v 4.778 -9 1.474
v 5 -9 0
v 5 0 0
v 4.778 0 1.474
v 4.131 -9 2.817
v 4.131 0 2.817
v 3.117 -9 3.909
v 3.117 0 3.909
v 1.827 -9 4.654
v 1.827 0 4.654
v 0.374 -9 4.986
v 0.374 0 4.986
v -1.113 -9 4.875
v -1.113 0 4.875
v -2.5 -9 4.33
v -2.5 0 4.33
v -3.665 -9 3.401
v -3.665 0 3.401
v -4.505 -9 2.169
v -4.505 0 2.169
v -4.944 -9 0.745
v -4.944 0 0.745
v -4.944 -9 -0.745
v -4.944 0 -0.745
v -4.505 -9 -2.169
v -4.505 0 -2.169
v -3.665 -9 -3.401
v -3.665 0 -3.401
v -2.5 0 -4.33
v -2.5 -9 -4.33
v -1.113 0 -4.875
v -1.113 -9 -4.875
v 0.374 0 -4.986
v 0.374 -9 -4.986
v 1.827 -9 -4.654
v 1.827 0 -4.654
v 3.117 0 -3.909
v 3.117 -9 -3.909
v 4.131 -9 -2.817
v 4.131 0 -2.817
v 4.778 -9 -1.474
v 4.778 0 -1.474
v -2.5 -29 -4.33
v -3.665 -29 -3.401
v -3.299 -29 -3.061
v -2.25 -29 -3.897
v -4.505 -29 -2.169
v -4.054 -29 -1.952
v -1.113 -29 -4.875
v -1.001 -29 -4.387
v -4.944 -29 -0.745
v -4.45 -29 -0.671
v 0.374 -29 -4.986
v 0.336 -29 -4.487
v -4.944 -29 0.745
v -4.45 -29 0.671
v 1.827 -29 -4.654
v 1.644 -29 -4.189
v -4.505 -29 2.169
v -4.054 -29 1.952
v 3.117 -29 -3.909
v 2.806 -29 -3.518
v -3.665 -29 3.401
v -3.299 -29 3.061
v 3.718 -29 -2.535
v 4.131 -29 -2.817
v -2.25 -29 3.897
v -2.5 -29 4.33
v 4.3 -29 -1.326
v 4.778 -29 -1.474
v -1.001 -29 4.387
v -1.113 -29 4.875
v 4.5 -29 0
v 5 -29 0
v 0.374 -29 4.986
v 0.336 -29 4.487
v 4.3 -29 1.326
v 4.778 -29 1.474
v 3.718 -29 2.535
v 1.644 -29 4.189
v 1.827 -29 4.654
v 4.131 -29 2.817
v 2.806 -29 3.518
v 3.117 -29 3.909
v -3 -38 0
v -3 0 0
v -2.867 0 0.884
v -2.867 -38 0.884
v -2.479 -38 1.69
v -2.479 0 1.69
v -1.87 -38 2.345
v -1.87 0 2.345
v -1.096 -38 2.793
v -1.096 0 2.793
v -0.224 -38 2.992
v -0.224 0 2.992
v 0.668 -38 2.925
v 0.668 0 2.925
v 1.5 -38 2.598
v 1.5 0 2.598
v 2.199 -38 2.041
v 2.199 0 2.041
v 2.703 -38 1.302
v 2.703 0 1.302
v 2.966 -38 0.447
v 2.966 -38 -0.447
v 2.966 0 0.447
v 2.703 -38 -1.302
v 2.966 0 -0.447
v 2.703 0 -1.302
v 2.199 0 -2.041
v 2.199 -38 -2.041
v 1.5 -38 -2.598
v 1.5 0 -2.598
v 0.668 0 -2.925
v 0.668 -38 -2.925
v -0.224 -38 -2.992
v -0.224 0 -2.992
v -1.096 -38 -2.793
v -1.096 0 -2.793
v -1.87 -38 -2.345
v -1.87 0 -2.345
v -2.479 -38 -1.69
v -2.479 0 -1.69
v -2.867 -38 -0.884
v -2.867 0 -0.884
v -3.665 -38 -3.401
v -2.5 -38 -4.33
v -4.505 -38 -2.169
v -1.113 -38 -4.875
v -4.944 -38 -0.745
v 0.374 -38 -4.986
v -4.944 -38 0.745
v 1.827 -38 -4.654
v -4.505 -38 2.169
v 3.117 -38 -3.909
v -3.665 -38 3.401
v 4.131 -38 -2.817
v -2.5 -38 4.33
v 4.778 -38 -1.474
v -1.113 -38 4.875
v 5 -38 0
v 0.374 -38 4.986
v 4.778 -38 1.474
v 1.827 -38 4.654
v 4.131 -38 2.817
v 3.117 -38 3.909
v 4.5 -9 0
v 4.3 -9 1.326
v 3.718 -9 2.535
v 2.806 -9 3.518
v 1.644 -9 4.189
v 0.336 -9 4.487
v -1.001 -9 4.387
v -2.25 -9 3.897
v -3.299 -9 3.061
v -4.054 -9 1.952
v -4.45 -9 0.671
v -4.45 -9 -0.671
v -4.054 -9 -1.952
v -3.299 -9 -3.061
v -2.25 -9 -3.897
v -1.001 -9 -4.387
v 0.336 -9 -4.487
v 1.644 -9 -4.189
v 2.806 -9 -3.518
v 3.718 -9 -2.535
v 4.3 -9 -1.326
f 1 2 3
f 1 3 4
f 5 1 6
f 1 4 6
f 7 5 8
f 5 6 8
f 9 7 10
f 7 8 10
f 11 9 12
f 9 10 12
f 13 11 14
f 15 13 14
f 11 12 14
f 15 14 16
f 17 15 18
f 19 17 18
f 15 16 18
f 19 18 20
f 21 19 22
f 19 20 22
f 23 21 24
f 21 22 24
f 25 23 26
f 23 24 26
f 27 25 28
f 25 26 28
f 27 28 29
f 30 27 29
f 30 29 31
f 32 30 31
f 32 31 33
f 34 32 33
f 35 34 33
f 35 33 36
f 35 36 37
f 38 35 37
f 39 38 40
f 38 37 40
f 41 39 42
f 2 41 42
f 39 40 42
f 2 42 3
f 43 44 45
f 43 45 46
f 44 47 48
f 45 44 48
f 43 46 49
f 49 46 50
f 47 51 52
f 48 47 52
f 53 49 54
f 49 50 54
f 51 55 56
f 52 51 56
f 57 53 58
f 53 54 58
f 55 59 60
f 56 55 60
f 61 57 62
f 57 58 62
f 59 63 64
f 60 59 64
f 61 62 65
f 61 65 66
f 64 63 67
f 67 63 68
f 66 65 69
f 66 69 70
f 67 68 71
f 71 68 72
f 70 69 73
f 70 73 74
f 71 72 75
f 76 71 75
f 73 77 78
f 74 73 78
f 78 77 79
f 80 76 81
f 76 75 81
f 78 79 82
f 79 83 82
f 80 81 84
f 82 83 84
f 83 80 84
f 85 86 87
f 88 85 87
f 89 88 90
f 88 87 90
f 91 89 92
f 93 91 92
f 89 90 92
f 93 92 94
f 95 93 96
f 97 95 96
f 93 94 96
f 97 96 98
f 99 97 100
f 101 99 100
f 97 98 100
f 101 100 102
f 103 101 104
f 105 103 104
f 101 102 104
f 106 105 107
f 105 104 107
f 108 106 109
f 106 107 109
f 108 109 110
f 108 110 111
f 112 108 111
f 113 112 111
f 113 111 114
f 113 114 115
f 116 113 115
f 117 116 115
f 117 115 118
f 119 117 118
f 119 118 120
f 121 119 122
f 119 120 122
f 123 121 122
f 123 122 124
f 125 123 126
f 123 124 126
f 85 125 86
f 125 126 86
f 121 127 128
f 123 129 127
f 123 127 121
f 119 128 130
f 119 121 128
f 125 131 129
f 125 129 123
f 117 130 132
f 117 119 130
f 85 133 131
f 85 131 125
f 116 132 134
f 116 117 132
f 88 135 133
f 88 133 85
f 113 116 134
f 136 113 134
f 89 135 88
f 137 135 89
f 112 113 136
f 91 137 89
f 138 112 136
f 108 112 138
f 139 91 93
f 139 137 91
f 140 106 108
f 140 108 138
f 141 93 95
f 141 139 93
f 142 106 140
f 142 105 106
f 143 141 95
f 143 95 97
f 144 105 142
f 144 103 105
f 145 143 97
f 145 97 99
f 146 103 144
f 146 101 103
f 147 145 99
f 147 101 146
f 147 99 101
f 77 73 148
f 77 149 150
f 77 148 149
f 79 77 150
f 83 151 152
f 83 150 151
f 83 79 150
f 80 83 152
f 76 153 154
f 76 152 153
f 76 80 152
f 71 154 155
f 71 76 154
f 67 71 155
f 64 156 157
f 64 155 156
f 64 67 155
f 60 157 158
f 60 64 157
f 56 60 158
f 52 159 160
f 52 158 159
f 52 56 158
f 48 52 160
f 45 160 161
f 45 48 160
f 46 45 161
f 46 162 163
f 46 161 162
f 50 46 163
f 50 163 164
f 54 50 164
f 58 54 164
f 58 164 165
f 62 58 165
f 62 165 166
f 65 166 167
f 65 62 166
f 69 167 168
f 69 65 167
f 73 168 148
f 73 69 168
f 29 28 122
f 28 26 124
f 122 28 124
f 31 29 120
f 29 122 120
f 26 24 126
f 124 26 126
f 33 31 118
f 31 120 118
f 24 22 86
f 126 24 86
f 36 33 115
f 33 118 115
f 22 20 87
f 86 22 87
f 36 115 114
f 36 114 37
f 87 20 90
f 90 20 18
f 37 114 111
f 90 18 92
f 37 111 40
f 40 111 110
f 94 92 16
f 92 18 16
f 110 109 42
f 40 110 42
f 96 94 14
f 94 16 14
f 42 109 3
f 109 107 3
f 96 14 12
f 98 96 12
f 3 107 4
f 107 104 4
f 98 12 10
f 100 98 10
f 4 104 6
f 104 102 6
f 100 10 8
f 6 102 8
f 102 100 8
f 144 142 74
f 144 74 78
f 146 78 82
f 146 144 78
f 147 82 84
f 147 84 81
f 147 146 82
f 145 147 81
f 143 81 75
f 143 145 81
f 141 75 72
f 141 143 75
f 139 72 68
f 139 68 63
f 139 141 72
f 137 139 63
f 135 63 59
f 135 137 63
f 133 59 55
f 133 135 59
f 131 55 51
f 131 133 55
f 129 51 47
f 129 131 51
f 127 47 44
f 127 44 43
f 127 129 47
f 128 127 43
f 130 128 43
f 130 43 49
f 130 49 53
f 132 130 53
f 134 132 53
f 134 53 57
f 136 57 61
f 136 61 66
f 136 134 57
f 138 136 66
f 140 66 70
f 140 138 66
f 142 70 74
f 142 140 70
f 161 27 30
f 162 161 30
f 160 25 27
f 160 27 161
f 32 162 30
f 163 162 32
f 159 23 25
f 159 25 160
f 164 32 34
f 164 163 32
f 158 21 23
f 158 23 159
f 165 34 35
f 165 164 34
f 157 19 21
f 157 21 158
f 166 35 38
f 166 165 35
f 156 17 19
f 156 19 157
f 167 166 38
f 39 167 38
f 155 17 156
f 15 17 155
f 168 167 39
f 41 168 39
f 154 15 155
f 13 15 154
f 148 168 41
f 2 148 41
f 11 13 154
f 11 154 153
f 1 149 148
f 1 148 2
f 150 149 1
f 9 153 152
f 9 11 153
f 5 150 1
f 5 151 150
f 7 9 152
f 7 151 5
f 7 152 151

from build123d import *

# Parameters (mm, degrees)
F0_R     = 5
F2_DEPTH = 9
F1_R     = 4.5
F3_DEPTH = 19
F6_R     = 3
F7_DEPTH = 38


with BuildPart() as f2:
    # F0 (on Front) → F2 (new body)
    with BuildSketch(Plane.XZ):
        Circle(F0_R)
    extrude(amount=F2_DEPTH)

    # F1 (on face) → F3 (join)
    with BuildSketch(Plane.XZ):
        Circle(F1_R)
    extrude(amount=F3_DEPTH)

    # F5: F2 across plane


with BuildPart() as f2_1:
    add(f2.part)
    add(f2.part.mirror(Plane.XZ.offset(19)))

    # F6 (on face) → F7 (cut)
    with BuildSketch(Plane(origin=(0, 0, 0), x_dir=(-1, 0, 0), z_dir=(0, 1, 0))):
        Circle(F6_R)
    extrude(amount=-F7_DEPTH, mode=Mode.SUBTRACT)


solid = f2_1.part
